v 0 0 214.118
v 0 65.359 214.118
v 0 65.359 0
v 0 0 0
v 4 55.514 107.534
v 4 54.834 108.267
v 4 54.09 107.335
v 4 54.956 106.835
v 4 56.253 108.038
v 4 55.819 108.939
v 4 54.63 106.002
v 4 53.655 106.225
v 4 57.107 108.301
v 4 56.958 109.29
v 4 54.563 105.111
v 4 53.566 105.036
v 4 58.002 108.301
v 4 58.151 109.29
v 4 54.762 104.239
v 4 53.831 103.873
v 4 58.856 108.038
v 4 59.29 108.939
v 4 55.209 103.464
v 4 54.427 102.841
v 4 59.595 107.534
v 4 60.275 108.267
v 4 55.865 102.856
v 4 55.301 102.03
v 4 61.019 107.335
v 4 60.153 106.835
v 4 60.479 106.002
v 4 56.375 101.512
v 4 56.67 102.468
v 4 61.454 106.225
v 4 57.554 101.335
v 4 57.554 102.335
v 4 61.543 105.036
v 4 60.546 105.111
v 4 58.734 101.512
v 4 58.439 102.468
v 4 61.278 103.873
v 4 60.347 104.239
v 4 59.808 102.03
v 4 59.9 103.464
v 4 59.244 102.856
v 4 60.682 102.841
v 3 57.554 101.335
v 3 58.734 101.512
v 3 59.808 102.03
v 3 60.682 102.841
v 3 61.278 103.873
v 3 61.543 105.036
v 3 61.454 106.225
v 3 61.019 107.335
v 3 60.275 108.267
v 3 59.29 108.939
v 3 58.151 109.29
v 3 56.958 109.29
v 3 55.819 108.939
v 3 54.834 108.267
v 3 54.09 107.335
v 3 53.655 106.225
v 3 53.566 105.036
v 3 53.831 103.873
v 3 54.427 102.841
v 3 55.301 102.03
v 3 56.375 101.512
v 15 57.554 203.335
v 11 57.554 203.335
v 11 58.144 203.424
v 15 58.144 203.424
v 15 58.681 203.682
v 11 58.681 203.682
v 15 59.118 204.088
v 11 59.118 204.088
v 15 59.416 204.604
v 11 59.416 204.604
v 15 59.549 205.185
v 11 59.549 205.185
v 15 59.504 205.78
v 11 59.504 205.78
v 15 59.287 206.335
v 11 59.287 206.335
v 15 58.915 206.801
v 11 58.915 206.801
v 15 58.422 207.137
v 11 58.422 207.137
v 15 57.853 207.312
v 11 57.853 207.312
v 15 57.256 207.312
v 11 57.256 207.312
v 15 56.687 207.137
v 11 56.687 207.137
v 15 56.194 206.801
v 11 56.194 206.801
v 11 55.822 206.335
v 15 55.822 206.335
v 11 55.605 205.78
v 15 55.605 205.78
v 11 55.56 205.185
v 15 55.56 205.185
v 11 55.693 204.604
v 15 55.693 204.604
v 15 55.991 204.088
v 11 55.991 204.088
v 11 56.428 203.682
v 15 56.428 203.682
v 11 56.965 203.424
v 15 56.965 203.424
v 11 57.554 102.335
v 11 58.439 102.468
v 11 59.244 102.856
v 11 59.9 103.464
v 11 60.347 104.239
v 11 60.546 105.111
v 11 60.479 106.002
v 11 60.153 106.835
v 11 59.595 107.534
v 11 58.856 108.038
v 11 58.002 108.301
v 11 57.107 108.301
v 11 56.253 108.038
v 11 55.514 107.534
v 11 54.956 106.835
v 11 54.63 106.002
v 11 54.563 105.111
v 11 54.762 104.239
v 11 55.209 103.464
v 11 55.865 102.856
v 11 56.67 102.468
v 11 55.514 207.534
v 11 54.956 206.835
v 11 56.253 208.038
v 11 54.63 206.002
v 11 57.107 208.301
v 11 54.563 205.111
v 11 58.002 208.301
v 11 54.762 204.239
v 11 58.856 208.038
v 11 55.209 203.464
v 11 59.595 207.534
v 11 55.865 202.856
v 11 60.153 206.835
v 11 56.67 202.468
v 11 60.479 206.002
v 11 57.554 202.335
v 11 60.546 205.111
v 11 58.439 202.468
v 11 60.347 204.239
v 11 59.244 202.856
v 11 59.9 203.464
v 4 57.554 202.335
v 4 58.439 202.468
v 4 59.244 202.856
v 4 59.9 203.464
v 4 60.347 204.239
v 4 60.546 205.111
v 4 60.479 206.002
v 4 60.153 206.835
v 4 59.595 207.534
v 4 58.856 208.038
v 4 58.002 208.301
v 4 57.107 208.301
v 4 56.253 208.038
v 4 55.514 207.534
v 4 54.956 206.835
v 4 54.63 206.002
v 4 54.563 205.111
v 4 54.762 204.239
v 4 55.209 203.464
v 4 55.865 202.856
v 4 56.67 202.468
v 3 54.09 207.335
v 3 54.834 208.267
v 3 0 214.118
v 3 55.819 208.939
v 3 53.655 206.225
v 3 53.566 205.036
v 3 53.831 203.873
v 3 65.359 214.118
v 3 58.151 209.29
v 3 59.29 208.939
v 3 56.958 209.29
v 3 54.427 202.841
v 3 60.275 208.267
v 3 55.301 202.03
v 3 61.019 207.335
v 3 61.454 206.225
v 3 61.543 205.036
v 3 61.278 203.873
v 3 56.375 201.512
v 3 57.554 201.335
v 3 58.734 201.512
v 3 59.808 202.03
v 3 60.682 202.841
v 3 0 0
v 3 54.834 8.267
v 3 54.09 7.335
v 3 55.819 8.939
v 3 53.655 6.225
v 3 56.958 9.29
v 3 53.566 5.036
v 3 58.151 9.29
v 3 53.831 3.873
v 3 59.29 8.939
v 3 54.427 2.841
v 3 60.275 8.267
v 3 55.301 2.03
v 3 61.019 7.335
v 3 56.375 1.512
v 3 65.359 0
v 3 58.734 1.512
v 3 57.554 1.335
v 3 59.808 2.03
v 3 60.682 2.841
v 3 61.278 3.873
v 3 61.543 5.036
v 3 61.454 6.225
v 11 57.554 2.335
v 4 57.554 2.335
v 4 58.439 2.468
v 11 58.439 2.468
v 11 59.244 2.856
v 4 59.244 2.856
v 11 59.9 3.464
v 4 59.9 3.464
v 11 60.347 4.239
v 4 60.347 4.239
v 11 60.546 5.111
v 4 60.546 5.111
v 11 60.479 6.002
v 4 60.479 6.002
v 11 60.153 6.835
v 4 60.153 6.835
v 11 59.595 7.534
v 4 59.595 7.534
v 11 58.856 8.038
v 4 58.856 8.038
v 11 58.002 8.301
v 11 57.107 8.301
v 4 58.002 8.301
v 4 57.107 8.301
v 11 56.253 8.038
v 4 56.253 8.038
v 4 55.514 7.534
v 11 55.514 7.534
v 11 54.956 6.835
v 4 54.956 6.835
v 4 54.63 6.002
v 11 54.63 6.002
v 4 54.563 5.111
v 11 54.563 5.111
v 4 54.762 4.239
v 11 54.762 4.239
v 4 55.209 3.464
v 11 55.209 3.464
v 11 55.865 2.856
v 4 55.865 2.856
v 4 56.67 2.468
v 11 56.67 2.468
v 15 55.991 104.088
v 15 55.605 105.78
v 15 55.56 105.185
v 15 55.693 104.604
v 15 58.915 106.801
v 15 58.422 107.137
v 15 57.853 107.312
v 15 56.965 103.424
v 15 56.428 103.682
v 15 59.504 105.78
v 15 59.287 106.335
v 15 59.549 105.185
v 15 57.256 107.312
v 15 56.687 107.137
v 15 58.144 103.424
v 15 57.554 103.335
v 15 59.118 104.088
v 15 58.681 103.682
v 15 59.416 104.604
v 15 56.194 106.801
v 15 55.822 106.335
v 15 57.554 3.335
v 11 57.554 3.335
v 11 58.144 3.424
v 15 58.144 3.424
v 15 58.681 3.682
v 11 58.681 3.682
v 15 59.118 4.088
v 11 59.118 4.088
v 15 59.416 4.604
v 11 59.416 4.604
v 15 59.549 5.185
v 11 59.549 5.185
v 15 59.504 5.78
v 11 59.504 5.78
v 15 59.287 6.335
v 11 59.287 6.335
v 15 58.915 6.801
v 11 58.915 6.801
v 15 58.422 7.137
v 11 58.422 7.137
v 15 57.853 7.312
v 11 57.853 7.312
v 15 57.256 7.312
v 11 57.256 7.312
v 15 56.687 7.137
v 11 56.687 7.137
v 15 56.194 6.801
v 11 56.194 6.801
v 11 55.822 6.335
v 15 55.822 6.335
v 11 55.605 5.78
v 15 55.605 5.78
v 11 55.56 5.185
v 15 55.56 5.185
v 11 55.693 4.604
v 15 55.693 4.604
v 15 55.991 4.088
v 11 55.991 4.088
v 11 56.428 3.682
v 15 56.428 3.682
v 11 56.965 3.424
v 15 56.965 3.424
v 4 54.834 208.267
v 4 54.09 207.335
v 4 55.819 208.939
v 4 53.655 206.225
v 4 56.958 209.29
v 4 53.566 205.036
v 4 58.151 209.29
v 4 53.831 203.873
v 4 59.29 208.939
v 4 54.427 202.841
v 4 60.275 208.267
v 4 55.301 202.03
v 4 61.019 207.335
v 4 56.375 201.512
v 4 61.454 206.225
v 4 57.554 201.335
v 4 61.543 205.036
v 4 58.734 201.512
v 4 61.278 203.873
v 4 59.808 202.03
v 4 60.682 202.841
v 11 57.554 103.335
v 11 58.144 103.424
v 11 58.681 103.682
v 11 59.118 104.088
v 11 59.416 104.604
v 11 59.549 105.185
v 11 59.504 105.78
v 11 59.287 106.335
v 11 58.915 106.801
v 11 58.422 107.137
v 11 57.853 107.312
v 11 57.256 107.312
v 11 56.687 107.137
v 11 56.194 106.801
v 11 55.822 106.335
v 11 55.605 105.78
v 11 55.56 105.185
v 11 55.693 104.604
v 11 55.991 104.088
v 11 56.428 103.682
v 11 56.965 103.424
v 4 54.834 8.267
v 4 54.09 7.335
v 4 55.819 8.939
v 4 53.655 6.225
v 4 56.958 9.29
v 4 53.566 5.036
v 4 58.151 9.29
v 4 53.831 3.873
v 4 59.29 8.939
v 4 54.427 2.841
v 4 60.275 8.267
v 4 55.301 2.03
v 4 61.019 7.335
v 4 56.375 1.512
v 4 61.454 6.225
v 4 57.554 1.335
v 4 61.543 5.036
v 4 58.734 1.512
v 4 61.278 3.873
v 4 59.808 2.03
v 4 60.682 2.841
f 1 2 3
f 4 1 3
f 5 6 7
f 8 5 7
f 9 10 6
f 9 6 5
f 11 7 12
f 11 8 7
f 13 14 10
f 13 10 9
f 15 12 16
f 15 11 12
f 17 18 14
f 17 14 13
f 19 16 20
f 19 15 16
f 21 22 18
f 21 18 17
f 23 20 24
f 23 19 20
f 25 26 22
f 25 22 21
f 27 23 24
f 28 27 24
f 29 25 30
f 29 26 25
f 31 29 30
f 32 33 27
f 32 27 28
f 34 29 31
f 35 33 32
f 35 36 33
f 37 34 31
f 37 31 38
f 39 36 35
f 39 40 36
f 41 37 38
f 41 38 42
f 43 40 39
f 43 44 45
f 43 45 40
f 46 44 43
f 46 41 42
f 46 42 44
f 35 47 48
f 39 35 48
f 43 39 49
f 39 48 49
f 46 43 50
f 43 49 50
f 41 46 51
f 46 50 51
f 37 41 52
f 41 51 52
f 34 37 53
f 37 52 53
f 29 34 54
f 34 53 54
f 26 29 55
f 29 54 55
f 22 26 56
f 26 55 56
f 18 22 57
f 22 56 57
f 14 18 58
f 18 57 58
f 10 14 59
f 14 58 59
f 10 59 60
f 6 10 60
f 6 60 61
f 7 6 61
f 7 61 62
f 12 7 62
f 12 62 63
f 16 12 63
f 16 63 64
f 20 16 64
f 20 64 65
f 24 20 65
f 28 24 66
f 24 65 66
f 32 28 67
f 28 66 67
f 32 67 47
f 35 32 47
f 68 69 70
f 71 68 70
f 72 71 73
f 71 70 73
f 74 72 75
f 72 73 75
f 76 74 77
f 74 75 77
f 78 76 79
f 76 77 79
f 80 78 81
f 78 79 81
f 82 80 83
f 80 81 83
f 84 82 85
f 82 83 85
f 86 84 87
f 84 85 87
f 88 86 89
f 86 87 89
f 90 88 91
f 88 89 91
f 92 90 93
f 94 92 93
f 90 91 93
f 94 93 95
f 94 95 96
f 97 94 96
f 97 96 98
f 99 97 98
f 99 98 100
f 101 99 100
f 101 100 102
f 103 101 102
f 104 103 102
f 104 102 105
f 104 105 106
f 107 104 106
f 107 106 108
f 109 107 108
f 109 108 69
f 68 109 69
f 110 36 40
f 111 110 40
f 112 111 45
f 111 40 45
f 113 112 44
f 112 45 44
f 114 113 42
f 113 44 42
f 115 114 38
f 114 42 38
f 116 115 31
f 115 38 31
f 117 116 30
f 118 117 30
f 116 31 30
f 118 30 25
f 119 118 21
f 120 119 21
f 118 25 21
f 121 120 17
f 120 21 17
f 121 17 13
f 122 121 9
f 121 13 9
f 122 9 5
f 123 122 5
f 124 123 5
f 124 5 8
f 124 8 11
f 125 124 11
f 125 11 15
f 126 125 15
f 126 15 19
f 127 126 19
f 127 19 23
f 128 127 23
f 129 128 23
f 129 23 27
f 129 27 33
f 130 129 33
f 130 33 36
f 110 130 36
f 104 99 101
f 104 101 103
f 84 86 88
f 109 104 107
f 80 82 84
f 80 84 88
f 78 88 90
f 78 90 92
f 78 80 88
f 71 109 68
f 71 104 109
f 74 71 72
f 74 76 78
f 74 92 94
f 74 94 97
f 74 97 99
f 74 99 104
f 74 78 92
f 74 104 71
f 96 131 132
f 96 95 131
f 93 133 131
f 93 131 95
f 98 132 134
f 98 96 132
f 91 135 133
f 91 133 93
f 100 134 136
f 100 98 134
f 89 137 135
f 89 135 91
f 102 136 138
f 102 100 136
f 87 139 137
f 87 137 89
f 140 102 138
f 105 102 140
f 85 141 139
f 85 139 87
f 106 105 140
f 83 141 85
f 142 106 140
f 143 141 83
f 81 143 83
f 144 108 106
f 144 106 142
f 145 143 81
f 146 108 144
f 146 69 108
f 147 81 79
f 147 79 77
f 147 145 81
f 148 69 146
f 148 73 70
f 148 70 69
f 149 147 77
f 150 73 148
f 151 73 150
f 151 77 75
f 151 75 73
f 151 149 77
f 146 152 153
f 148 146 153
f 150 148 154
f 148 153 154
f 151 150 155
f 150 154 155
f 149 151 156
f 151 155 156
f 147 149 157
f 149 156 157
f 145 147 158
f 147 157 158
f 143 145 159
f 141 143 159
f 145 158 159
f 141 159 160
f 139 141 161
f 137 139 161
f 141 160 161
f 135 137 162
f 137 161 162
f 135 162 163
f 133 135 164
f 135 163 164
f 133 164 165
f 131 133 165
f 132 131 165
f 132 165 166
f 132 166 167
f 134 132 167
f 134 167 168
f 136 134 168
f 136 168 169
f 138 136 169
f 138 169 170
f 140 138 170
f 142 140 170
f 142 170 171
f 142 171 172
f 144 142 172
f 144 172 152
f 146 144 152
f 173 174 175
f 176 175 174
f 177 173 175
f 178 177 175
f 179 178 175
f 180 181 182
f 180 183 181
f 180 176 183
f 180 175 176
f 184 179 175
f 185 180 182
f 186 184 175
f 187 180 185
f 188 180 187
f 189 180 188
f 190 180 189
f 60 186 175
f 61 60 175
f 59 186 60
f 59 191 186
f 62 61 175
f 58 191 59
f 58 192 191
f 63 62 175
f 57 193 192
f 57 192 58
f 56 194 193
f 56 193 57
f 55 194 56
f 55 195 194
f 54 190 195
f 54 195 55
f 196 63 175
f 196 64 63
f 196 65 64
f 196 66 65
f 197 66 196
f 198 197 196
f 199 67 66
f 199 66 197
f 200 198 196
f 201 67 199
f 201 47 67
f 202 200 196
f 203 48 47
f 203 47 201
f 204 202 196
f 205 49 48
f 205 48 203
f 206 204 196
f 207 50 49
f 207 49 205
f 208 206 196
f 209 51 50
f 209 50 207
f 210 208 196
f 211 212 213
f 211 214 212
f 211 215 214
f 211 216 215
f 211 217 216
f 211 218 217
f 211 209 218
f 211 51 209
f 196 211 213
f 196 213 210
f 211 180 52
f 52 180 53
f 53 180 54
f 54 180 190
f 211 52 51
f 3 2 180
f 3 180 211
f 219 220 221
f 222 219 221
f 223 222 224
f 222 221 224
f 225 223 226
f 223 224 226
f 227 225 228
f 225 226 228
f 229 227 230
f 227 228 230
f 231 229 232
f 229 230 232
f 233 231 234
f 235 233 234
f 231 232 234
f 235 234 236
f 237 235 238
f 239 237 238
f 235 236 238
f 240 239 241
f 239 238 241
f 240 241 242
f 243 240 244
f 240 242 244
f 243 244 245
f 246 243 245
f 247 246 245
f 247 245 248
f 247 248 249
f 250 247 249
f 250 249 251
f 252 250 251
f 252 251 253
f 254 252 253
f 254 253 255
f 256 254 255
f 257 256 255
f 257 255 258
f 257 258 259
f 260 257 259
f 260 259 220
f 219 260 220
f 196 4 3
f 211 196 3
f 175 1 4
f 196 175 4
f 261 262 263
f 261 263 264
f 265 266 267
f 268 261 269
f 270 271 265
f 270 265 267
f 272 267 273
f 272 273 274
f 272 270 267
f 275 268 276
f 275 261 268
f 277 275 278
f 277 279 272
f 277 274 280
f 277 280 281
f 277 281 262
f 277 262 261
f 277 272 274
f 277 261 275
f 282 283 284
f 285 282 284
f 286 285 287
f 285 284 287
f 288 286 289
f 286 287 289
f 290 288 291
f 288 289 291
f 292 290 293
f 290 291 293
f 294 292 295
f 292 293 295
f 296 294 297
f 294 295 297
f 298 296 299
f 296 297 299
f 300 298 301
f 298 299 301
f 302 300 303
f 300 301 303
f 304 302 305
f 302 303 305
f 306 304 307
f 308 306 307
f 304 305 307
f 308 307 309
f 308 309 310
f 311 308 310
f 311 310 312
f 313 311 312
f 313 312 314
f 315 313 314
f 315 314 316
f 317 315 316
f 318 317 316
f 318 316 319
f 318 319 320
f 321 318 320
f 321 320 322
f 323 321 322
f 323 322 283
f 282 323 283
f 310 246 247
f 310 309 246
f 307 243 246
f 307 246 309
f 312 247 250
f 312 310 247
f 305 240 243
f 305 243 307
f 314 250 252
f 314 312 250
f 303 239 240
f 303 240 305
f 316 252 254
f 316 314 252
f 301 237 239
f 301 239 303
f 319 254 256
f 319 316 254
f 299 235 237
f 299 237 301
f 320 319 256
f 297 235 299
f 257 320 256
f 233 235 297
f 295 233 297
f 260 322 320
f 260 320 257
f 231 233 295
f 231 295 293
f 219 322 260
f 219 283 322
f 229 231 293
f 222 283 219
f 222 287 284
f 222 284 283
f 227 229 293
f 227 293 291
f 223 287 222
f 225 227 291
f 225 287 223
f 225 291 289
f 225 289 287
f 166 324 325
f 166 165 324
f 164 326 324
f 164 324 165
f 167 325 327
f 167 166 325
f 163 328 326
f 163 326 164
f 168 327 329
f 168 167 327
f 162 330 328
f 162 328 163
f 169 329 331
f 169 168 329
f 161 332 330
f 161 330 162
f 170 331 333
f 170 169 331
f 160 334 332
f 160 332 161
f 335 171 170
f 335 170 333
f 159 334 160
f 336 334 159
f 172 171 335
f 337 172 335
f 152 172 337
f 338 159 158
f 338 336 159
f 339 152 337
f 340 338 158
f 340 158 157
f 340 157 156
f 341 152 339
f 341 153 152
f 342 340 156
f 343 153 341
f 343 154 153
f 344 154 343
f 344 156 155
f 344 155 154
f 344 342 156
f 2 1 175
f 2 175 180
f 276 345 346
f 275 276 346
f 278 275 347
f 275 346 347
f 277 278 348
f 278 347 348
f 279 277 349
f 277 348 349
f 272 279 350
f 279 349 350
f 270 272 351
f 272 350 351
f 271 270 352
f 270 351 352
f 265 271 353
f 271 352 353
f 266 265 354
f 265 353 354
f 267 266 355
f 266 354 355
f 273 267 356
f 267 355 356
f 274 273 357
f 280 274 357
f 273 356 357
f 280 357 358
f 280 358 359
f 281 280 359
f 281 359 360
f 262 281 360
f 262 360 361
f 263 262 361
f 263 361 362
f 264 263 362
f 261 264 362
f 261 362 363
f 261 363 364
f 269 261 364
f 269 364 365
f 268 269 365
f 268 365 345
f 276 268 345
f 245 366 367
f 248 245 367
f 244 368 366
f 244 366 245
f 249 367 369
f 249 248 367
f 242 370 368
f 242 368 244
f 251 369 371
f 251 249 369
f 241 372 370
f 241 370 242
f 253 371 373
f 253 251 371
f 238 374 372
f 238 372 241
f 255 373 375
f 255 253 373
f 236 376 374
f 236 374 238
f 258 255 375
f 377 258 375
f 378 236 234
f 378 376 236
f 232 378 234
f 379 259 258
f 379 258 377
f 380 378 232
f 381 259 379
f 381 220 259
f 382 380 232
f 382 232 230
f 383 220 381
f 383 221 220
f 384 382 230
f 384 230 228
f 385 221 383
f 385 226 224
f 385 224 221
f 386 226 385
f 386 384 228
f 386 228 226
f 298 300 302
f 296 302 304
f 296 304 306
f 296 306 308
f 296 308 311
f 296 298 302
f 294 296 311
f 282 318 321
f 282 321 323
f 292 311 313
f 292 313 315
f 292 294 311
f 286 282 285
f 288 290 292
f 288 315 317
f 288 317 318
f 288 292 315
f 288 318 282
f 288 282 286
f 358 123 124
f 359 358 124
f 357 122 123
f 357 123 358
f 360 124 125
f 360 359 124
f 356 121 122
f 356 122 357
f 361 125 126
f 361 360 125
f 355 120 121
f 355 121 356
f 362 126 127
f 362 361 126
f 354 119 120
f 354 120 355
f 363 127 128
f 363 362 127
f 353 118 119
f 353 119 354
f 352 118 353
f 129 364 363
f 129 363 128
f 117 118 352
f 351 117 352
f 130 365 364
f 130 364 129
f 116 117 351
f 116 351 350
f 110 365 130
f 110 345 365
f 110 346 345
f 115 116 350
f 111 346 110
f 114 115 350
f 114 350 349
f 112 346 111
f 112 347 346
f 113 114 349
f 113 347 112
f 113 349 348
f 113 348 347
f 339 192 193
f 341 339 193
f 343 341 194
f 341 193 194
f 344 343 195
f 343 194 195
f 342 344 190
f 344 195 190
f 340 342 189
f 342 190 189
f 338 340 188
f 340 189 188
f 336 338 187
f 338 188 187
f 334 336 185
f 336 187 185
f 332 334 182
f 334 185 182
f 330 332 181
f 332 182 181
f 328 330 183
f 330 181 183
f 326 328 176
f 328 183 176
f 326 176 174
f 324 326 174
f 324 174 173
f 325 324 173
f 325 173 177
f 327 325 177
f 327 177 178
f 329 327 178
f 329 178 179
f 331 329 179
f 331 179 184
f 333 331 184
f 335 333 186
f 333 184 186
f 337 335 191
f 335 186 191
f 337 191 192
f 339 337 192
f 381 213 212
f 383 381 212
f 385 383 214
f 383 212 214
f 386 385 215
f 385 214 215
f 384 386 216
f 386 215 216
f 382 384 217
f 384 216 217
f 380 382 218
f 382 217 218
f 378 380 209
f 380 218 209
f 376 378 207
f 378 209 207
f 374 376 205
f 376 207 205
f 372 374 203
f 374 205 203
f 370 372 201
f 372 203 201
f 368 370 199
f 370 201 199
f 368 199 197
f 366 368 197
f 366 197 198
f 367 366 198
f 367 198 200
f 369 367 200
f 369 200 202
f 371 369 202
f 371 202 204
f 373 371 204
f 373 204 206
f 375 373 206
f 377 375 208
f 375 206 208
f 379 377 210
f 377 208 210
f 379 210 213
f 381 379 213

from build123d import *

# Parameters (mm, degrees)
SKETCH_1_W       = 214.117990109
SKETCH_1_H       = 65.359241046
EXTRUDE_1_DEPTH  = 3
SKETCH_2_R       = 2
EXTRUDE_2_DEPTH  = 12
SKETCH_3_R       = 2
EXTRUDE_3_DEPTH  = 12
SKETCH_4_R       = 2
EXTRUDE_4_DEPTH  = 12
SKETCH_5_R       = 3
EXTRUDE_5_DEPTH  = 8
SKETCH_6_R       = 4
EXTRUDE_6_DEPTH  = 1
SKETCH_7_R       = 3
EXTRUDE_7_DEPTH  = 8
SKETCH_8_R       = 3
EXTRUDE_8_DEPTH  = 8
SKETCH_9_R       = 4
EXTRUDE_9_DEPTH  = 1
SKETCH_10_R      = 4
EXTRUDE_10_DEPTH = 1


with BuildPart() as part:
    # 草图1 → 凸台-拉伸1 (new body)
    with BuildSketch(Plane(origin=(0, 0, 0), x_dir=(0, 0, -1), z_dir=(1, 0, 0))):
        with Locations((-107.058995055, 32.679620523)):
            Rectangle(SKETCH_1_W, SKETCH_1_H)
    extrude(amount=EXTRUDE_1_DEPTH)

    # 草图2 → 凸台-拉伸2 (add)
    with BuildSketch(Plane(origin=(3, 0, 0), x_dir=(0, 0, -1), z_dir=(1, 0, 0))):
        with Locations((-5.33476711, 57.554484424)):
            Circle(SKETCH_2_R)
    extrude(amount=EXTRUDE_2_DEPTH)

    # 草图3 → 凸台-拉伸3 (add)
    with BuildSketch(Plane(origin=(3, 0, 0), x_dir=(0, 0, -1), z_dir=(1, 0, 0))):
        with Locations((-105.33476711, 57.554484424)):
            Circle(SKETCH_3_R)
    extrude(amount=EXTRUDE_3_DEPTH)

    # 草图4 → 凸台-拉伸4 (add)
    with BuildSketch(Plane(origin=(3, 0, 0), x_dir=(0, 0, -1), z_dir=(1, 0, 0))):
        with Locations((-205.33476711, 57.554484424)):
            Circle(SKETCH_4_R)
    extrude(amount=EXTRUDE_4_DEPTH)

    # 草图5 → 凸台-拉伸5 (add)
    with BuildSketch(Plane(origin=(3, 0, 0), x_dir=(0, 0, -1), z_dir=(1, 0, 0))):
        with Locations((-5.33476711, 57.554484424)):
            Circle(SKETCH_5_R)
    extrude(amount=EXTRUDE_5_DEPTH)

    # 草图6 → 凸台-拉伸6 (add)
    with BuildSketch(Plane(origin=(3, 0, 0), x_dir=(0, 0, -1), z_dir=(1, 0, 0))):
        with Locations((-5.33476711, 57.554484424)):
            Circle(SKETCH_6_R)
    extrude(amount=EXTRUDE_6_DEPTH)

    # 草图7 → 凸台-拉伸7 (add)
    with BuildSketch(Plane(origin=(3, 0, 0), x_dir=(0, 0, -1), z_dir=(1, 0, 0))):
        with Locations((-105.33476711, 57.554484424)):
            Circle(SKETCH_7_R)
    extrude(amount=EXTRUDE_7_DEPTH)

    # 草图8 → 凸台-拉伸8 (add)
    with BuildSketch(Plane(origin=(3, 0, 0), x_dir=(0, 0, -1), z_dir=(1, 0, 0))):
        with Locations((-205.33476711, 57.554484424)):
            Circle(SKETCH_8_R)
    extrude(amount=EXTRUDE_8_DEPTH)

    # 草图9 → 凸台-拉伸9 (add)
    with BuildSketch(Plane(origin=(3, 0, 0), x_dir=(0, 0, -1), z_dir=(1, 0, 0))):
        with Locations((-105.33476711, 57.554484424)):
            Circle(SKETCH_9_R)
    extrude(amount=EXTRUDE_9_DEPTH)

    # 草图10 → 凸台-拉伸10 (add)
    with BuildSketch(Plane(origin=(3, 0, 0), x_dir=(0, 0, -1), z_dir=(1, 0, 0))):
        with Locations((-205.33476711, 57.554484424)):
            Circle(SKETCH_10_R)
    extrude(amount=EXTRUDE_10_DEPTH)


solid = part.part
